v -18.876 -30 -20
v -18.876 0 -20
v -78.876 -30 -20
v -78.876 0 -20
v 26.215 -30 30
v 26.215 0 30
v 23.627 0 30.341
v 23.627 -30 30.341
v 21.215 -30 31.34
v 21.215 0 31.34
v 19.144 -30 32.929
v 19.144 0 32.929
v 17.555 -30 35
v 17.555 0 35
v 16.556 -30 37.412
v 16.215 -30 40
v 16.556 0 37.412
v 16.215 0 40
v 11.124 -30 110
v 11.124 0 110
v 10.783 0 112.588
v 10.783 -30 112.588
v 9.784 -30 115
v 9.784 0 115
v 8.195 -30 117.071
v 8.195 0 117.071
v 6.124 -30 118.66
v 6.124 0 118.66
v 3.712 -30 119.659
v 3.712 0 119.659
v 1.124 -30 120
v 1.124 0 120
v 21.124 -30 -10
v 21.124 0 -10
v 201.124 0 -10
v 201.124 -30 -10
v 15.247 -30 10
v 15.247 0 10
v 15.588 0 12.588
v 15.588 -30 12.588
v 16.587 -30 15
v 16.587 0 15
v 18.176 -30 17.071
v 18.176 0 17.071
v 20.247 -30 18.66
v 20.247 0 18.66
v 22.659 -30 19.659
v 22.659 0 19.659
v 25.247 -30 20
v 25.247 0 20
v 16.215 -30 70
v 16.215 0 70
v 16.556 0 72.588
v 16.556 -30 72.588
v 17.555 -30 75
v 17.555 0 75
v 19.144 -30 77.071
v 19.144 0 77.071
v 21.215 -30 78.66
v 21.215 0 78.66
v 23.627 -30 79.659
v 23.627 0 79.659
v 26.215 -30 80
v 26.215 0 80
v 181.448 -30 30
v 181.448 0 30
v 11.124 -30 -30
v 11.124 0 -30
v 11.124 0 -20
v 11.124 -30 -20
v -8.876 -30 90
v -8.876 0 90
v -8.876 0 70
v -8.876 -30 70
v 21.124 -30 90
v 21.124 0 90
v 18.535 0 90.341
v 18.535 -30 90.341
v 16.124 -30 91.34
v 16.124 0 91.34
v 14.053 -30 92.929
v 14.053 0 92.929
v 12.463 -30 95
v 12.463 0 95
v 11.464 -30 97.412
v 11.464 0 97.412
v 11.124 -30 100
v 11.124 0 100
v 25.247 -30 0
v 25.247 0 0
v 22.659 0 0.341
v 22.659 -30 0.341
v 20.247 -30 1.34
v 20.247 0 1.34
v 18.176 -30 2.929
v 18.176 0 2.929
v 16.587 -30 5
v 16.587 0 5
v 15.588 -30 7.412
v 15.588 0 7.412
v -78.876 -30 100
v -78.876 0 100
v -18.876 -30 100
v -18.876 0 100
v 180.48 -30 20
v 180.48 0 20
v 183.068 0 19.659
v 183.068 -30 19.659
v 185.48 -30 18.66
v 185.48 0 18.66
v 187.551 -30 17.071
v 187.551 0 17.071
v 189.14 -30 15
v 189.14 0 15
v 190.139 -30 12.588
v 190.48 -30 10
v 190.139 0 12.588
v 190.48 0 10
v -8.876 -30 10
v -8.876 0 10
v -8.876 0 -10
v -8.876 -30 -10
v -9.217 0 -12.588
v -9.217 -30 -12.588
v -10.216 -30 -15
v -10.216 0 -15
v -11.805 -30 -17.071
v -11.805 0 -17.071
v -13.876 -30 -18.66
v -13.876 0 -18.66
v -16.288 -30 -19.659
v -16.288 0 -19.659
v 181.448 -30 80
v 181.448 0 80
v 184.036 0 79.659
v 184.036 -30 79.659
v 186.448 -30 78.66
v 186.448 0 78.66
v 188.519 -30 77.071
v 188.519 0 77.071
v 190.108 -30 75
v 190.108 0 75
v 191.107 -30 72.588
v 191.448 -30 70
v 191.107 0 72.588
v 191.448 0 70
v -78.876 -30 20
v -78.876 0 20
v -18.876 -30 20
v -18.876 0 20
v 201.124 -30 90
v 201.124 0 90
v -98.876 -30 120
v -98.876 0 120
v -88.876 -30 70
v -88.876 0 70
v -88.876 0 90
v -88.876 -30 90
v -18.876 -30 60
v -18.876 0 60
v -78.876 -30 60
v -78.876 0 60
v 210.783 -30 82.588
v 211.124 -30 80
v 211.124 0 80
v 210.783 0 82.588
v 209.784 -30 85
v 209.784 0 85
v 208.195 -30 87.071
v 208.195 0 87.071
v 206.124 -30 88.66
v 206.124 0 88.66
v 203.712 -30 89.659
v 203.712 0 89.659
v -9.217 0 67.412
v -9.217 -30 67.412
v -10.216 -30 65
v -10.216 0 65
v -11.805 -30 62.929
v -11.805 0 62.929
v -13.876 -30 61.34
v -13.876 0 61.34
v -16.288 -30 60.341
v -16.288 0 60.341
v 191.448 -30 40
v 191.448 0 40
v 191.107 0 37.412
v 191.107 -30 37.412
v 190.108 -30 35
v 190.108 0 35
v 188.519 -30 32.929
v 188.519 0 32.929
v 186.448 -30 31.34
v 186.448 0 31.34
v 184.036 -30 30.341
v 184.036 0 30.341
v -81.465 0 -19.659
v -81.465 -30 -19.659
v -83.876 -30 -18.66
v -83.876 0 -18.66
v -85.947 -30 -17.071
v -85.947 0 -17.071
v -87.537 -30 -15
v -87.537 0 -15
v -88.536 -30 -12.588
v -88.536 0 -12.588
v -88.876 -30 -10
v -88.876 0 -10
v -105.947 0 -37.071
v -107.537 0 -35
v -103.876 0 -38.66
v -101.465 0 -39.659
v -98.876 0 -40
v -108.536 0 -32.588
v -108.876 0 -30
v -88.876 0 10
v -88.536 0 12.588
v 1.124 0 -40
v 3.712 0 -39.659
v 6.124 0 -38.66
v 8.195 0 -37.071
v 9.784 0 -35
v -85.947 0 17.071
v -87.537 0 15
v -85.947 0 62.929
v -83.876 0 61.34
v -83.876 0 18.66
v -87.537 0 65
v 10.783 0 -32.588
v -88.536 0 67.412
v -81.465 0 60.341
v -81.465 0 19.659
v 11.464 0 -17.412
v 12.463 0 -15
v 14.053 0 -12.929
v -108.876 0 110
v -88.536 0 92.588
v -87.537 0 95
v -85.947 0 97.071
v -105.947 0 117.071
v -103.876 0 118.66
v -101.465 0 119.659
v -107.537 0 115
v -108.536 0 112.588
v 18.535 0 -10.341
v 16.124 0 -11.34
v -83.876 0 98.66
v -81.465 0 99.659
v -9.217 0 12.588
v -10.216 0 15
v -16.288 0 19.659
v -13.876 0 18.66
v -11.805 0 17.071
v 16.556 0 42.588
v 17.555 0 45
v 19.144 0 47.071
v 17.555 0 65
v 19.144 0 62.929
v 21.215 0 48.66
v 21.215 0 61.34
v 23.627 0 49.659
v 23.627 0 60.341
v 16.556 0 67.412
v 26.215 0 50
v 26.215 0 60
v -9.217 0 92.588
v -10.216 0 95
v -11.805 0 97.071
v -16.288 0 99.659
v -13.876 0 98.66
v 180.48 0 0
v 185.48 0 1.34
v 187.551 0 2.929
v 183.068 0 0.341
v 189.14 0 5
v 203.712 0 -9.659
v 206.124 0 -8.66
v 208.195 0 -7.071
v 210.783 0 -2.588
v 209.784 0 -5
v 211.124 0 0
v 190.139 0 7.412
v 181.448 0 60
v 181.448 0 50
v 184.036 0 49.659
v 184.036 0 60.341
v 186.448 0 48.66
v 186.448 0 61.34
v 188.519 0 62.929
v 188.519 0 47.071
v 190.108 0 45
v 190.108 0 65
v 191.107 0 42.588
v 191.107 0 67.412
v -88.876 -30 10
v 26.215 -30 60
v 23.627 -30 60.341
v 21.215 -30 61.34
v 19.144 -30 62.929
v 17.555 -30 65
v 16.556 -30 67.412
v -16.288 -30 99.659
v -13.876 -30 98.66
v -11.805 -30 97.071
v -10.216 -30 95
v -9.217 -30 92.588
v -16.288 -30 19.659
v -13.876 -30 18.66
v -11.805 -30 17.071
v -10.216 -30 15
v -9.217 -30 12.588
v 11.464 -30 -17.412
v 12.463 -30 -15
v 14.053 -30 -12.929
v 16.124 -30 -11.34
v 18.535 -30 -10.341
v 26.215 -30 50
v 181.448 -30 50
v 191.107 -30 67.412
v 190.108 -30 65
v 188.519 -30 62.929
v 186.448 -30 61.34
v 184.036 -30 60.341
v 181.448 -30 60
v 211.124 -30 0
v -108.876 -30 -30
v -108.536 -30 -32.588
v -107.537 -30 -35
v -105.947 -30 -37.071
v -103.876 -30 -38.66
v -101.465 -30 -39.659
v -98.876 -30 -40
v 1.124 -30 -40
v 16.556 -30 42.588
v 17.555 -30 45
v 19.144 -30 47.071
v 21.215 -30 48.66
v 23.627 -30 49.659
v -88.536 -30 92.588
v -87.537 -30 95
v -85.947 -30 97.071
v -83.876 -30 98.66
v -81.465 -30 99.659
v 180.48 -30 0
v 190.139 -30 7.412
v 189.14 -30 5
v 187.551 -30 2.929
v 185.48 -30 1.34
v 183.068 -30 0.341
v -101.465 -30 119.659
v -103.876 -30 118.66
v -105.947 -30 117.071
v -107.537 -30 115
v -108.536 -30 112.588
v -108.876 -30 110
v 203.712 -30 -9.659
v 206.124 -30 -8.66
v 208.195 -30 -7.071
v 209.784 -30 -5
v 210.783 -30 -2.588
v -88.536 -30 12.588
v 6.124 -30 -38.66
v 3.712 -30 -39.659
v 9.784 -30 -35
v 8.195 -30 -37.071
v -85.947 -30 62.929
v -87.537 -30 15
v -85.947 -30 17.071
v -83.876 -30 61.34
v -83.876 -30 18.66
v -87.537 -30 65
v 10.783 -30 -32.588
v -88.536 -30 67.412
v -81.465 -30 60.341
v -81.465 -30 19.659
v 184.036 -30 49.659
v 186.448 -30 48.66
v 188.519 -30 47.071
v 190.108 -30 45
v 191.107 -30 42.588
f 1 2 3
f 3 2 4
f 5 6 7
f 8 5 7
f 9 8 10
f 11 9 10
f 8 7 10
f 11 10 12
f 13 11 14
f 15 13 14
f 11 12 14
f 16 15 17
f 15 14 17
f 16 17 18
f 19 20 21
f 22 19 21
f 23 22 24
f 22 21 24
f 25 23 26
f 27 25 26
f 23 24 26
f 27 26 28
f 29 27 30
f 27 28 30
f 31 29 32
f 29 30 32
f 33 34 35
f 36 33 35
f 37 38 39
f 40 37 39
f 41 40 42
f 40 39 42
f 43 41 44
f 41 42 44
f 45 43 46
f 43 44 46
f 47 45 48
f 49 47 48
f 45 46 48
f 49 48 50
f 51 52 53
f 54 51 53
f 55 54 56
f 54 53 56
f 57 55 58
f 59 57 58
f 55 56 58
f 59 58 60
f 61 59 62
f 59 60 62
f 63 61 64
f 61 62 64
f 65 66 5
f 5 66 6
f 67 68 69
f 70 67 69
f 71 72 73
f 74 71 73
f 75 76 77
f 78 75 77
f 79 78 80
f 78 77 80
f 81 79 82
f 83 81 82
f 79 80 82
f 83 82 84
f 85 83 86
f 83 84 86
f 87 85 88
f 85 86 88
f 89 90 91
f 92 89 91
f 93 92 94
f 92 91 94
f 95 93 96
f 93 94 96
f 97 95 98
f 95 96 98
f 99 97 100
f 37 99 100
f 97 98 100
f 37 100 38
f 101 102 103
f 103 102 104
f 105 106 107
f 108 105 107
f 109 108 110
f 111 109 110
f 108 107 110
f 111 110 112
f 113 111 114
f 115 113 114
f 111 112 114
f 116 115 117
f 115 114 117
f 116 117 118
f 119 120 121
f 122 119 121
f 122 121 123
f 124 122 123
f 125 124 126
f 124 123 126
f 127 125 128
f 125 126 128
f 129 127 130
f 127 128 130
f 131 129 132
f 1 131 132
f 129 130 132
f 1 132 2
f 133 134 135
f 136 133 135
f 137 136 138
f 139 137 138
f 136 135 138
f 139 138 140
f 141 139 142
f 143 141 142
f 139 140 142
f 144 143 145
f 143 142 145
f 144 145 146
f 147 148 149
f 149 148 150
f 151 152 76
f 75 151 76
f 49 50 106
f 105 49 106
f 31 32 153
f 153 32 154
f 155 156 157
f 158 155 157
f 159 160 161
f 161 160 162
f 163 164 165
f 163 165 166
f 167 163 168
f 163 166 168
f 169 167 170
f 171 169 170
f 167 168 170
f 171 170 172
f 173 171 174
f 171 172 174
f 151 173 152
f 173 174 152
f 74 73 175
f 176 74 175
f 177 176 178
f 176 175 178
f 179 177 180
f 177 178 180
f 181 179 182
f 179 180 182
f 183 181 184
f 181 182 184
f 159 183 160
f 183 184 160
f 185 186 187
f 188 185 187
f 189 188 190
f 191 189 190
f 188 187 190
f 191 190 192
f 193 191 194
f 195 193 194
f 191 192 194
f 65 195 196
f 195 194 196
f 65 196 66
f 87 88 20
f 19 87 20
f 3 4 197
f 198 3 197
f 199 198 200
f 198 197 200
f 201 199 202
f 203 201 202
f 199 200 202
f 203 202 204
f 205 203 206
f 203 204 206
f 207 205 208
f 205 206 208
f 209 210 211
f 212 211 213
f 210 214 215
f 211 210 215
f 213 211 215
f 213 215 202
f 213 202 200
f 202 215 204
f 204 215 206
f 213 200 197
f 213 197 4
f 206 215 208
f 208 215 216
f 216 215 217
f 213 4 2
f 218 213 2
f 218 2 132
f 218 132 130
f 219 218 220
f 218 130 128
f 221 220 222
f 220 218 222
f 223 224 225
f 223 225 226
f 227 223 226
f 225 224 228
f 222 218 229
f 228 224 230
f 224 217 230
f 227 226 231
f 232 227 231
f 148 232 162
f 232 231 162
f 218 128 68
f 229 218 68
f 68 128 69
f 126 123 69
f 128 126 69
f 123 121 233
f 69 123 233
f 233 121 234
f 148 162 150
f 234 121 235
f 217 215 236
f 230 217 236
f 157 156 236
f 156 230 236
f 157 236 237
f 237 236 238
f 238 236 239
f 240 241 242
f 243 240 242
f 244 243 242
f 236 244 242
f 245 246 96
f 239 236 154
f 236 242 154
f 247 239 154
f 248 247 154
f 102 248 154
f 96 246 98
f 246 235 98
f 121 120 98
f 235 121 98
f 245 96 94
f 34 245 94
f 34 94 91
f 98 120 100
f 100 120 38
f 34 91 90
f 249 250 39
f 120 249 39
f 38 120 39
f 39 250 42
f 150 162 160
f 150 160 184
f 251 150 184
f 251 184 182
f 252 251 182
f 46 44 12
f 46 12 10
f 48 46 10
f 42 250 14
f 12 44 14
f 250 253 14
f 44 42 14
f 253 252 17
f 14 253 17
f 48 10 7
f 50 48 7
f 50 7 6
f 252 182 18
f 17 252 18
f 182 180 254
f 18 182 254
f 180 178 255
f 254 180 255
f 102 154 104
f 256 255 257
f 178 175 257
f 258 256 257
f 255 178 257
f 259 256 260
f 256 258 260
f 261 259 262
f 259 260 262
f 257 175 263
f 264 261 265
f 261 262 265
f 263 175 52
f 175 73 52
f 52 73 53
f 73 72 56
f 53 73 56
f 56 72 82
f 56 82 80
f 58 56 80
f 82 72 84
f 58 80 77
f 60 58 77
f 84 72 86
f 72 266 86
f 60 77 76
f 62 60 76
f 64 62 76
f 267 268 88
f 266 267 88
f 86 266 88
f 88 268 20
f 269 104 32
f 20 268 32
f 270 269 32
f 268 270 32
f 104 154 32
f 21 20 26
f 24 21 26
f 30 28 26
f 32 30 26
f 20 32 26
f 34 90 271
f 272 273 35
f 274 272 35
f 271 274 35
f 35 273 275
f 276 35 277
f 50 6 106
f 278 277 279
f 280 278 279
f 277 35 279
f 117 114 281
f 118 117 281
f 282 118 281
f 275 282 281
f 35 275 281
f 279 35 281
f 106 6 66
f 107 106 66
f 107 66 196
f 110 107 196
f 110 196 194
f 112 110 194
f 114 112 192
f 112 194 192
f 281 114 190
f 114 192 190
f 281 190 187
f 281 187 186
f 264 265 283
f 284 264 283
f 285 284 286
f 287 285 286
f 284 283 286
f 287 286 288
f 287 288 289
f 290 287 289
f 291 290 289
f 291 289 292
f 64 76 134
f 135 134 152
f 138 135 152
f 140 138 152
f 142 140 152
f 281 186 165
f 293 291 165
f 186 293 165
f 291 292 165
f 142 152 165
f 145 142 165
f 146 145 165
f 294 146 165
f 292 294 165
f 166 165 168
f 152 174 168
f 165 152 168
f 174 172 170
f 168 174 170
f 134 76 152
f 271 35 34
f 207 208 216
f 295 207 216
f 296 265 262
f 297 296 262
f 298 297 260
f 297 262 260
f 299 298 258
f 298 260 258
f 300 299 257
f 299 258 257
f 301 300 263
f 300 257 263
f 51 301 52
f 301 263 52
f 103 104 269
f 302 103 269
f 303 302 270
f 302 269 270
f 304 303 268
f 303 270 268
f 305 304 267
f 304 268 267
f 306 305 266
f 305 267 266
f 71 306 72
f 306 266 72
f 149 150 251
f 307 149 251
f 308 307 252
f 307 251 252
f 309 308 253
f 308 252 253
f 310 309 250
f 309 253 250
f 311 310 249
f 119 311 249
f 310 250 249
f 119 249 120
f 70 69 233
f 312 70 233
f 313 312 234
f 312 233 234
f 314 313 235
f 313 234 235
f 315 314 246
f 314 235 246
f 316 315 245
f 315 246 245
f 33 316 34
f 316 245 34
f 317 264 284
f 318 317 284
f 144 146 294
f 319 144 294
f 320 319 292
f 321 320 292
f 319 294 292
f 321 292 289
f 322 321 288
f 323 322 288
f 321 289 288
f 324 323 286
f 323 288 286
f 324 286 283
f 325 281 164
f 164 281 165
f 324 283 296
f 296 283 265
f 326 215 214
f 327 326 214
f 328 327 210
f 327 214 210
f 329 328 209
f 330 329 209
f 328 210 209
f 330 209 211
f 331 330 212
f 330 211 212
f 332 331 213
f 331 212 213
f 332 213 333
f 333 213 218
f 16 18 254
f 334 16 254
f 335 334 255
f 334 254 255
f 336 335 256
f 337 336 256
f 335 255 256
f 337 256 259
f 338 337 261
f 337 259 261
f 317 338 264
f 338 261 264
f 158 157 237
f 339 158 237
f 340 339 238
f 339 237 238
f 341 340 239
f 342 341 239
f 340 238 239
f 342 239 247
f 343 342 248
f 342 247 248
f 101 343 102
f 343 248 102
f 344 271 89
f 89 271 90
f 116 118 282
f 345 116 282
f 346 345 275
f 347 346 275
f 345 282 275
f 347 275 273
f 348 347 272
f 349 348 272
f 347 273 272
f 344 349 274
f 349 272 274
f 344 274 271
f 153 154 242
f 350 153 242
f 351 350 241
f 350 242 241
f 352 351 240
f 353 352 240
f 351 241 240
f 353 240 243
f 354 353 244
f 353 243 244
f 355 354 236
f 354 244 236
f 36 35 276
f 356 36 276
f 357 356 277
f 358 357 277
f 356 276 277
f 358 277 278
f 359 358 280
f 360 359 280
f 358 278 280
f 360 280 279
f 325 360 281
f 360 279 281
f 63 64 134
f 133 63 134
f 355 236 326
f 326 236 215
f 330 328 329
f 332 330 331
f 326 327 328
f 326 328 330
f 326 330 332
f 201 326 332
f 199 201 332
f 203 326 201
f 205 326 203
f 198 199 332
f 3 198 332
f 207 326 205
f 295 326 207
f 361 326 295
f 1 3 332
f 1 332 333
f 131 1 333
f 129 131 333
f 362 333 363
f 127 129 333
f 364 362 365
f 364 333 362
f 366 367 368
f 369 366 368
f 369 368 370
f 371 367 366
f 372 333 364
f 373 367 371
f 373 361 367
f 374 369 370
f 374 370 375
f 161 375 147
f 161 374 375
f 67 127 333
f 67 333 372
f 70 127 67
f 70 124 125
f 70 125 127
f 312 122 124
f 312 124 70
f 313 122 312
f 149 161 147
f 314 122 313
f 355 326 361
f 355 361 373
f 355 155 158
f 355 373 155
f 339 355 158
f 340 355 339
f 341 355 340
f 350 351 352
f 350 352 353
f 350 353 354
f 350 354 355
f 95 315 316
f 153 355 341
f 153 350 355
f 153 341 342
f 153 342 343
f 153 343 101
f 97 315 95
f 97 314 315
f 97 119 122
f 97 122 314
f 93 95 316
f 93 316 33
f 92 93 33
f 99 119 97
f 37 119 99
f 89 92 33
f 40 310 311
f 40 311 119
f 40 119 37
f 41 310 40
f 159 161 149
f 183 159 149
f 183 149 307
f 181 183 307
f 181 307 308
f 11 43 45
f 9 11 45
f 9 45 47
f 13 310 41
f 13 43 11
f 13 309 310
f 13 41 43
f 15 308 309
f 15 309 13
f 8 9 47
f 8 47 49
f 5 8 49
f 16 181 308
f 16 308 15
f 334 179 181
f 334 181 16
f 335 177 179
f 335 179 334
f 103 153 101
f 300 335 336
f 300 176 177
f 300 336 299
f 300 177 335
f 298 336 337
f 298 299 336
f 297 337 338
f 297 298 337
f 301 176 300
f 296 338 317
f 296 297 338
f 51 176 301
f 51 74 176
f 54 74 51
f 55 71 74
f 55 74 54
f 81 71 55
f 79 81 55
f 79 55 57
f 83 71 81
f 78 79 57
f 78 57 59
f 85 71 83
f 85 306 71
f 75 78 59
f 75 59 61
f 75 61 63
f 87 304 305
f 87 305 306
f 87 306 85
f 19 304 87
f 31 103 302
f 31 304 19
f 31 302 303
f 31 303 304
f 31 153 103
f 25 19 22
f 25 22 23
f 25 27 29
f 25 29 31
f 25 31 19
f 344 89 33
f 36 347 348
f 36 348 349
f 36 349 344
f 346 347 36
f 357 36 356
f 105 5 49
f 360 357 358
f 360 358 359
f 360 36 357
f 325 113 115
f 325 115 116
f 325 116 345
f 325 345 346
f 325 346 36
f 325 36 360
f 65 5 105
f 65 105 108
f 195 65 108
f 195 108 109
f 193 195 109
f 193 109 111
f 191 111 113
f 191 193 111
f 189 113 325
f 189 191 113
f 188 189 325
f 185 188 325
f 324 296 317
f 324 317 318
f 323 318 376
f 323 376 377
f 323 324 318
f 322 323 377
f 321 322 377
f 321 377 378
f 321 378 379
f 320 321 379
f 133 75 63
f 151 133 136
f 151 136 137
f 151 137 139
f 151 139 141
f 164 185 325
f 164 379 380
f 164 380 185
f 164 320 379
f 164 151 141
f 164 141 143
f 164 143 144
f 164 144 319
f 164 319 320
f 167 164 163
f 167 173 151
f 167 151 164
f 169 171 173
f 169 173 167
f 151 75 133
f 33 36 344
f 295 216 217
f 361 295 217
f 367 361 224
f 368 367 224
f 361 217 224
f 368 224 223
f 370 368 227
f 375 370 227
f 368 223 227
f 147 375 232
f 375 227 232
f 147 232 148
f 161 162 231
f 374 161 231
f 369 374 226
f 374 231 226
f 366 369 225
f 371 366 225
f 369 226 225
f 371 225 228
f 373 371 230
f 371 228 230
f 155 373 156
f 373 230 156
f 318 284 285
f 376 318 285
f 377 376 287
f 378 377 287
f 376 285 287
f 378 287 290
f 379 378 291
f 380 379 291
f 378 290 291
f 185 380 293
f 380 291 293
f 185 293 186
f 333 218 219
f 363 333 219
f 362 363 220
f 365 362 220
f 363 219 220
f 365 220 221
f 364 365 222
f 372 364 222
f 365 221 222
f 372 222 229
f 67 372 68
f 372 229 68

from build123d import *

# Parameters (mm, degrees)
F1_DEPTH = 30


with BuildPart() as f1:
    # F0 (on Front) → F1 (new body)
    with BuildSketch(Plane.XZ):
        with BuildLine():
            Line((211.123637, 0), (211.123637, 80))
            ThreePointArc((211.123637, 80), (208.194705, 87.071068), (201.123637, 90))
            Line((201.123637, 90), (21.123637, 90))
            ThreePointArc((21.123637, 90), (14.052569, 92.928932), (11.123637, 100))
            Line((11.123637, 100), (11.123637, 110))
            ThreePointArc((11.123637, 110), (8.194705, 117.071068), (1.123637, 120))
            Line((1.123637, 120), (-98.876363, 120))
            ThreePointArc((-98.876363, 120), (-105.947431, 117.071068), (-108.876363, 110))
            Line((-108.876363, 110), (-108.876363, -30))
            ThreePointArc((-108.876363, -30), (-105.947431, -37.071068), (-98.876363, -40))
            Line((-98.876363, -40), (1.123637, -40))
            ThreePointArc((1.123637, -40), (8.194705, -37.071068), (11.123637, -30))
            Line((11.123637, -30), (11.123637, -20))
            ThreePointArc((11.123637, -20), (14.052569, -12.928932), (21.123637, -10))
            Line((21.123637, -10), (201.123637, -10))
            ThreePointArc((201.123637, -10), (208.194705, -7.071068), (211.123637, 0))
        make_face()
        with BuildLine():
            ThreePointArc((-88.876363, 10), (-85.947431, 17.071068), (-78.876363, 20))
            Line((-78.876363, 20), (-18.876363, 20))
            ThreePointArc((-18.876363, 20), (-11.805295, 17.071068), (-8.876363, 10))
            Line((-8.876363, 10), (-8.876363, -10))
            ThreePointArc((-8.876363, -10), (-11.805295, -17.071068), (-18.876363, -20))
            Line((-18.876363, -20), (-78.876363, -20))
            ThreePointArc((-78.876363, -20), (-85.947431, -17.071068), (-88.876363, -10))
            Line((-88.876363, -10), (-88.876363, 10))
        make_face(mode=Mode.SUBTRACT)
        with BuildLine():
            ThreePointArc((15.246786, 10), (18.175718, 17.071068), (25.246786, 20))
            Line((25.246786, 20), (180.47985, 20))
            ThreePointArc((180.47985, 20), (187.550918, 17.071068), (190.47985, 10))
            ThreePointArc((190.47985, 10), (187.550918, 2.928932), (180.47985, 0))
            Line((180.47985, 0), (25.246786, 0))
            ThreePointArc((25.246786, 0), (18.175718, 2.928932), (15.246786, 10))
        make_face(mode=Mode.SUBTRACT)
        with BuildLine():
            ThreePointArc((-88.876363, 90), (-85.947431, 97.071068), (-78.876363, 100))
            Line((-78.876363, 100), (-18.876363, 100))
            ThreePointArc((-18.876363, 100), (-11.805295, 97.071068), (-8.876363, 90))
            Line((-8.876363, 90), (-8.876363, 70))
            ThreePointArc((-8.876363, 70), (-11.805295, 62.928932), (-18.876363, 60))
            Line((-18.876363, 60), (-78.876363, 60))
            ThreePointArc((-78.876363, 60), (-85.947431, 62.928932), (-88.876363, 70))
            Line((-88.876363, 70), (-88.876363, 90))
        make_face(mode=Mode.SUBTRACT)
        with BuildLine():
            ThreePointArc((16.214924, 40), (19.143856, 47.071068), (26.214924, 50))
            Line((26.214924, 50), (181.447988, 50))
            ThreePointArc((181.447988, 50), (188.519056, 47.071068), (191.447988, 40))
            ThreePointArc((191.447988, 40), (188.519056, 32.928932), (181.447988, 30))
            Line((181.447988, 30), (26.214924, 30))
            ThreePointArc((26.214924, 30), (19.143856, 32.928932), (16.214924, 40))
        make_face(mode=Mode.SUBTRACT)
        with BuildLine():
            ThreePointArc((16.214924, 70), (19.143856, 77.071068), (26.214924, 80))
            Line((26.214924, 80), (181.447988, 80))
            ThreePointArc((181.447988, 80), (188.519056, 77.071068), (191.447988, 70))
            ThreePointArc((191.447988, 70), (188.519056, 62.928932), (181.447988, 60))
            Line((181.447988, 60), (26.214924, 60))
            ThreePointArc((26.214924, 60), (19.143856, 62.928932), (16.214924, 70))
        make_face(mode=Mode.SUBTRACT)
    extrude(amount=F1_DEPTH)


solid = f1.part
